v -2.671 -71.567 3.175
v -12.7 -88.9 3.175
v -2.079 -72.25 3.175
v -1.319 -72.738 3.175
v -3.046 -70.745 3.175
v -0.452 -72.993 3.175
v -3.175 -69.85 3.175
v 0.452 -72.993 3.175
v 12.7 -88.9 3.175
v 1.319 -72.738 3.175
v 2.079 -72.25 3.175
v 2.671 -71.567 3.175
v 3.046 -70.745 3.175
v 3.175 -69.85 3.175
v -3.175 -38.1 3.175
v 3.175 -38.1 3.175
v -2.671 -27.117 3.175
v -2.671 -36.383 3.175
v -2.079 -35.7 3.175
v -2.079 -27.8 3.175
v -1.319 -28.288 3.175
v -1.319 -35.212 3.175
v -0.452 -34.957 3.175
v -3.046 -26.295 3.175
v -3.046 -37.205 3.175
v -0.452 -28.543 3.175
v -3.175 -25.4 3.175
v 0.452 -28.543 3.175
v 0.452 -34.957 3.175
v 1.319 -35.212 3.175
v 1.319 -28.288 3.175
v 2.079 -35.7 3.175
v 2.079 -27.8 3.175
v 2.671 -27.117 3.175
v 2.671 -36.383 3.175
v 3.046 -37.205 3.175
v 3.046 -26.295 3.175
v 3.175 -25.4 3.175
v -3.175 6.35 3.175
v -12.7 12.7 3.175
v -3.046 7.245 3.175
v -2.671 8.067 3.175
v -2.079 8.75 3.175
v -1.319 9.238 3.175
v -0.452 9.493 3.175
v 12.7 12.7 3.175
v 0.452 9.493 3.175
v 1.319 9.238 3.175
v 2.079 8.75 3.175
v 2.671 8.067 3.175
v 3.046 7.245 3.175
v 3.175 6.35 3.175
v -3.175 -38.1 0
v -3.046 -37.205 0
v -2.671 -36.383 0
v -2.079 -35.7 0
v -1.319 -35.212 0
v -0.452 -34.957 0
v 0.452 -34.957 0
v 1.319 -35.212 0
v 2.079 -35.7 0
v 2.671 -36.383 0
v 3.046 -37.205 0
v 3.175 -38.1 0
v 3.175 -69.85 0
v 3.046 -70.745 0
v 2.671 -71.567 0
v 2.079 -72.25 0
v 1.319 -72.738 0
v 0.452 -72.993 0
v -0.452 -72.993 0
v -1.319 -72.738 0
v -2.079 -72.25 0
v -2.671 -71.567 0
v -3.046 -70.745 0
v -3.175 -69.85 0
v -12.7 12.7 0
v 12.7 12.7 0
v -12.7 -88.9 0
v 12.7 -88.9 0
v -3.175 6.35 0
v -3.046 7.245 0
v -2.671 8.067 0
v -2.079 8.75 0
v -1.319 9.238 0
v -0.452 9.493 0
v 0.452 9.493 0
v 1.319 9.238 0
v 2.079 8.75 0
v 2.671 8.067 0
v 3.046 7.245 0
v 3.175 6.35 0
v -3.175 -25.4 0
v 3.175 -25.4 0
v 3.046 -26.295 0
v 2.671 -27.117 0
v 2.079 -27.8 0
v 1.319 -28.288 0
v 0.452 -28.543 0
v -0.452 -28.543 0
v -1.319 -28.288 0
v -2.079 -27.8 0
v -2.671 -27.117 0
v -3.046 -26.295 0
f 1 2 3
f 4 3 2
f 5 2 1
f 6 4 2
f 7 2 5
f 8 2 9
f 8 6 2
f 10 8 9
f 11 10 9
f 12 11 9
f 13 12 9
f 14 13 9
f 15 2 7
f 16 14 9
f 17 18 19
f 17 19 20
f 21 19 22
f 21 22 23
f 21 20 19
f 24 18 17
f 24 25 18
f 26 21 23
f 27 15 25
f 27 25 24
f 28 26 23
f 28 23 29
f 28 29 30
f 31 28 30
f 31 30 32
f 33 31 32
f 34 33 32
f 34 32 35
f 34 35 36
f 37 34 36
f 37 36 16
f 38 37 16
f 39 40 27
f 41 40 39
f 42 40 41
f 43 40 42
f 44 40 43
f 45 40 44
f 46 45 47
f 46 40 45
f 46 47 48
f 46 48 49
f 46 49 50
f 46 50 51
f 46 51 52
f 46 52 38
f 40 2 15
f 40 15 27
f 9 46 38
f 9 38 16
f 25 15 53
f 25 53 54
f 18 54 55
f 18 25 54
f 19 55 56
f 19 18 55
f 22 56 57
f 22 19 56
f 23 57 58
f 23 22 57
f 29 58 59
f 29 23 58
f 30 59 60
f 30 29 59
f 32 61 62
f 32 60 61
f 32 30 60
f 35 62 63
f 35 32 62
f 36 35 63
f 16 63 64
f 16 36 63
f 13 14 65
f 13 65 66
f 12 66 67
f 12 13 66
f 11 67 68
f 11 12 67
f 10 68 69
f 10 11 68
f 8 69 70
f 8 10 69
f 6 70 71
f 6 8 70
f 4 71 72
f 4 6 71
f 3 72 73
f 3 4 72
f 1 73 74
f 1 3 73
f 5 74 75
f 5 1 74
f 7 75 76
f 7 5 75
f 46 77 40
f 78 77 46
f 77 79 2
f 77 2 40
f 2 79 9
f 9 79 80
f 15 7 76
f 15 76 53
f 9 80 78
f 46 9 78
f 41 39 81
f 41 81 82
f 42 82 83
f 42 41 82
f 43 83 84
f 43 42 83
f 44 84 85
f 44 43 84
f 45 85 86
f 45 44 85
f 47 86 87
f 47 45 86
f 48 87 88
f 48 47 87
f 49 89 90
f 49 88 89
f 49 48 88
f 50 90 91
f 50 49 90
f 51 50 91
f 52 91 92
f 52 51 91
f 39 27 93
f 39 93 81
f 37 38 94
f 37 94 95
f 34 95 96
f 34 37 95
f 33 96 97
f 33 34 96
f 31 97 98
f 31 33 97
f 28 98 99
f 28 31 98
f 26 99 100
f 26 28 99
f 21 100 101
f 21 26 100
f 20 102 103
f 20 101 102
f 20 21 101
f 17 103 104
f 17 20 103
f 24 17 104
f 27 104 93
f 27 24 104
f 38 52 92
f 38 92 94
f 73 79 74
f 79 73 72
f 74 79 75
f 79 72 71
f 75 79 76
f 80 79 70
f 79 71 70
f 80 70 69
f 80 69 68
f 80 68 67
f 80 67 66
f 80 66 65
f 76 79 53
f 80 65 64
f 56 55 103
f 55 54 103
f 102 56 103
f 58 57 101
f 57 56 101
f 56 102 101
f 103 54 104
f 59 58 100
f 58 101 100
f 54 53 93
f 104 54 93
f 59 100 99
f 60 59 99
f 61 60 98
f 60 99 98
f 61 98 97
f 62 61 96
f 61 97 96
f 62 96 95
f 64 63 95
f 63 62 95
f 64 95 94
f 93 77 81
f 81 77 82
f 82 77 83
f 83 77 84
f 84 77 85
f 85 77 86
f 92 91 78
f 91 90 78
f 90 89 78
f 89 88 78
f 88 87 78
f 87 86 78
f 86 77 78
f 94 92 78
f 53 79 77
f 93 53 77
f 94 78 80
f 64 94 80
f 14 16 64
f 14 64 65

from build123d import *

# Parameters (mm, degrees)
SKETCH1_W           = 25.4
SKETCH1_H           = 101.6
SKETCH1_R           = 2.38125
BOSS_EXTRUDE1_DEPTH = 3.175
CUT_EXTRUDE1_DEPTH  = 4.175


with BuildPart() as part:
    # Sketch1 → Boss-Extrude1 (new body)
    with BuildSketch(Plane.XY):
        with Locations((0, -38.1)):
            Rectangle(SKETCH1_W, SKETCH1_H)
        with Locations((0, 6.35)):
            Circle(SKETCH1_R, mode=Mode.SUBTRACT)
        with Locations((0, -69.85)):
            Circle(SKETCH1_R, mode=Mode.SUBTRACT)
    extrude(amount=BOSS_EXTRUDE1_DEPTH)

    # Sketch2 → Cut-Extrude1 (cut, through all)
    with BuildSketch(Plane.XY.offset(3.175)):
        with BuildLine():
            Line((-3.175, -25.4), (-3.175, 6.35))
            ThreePointArc((-3.175, 6.35), (0, 9.525), (3.175, 6.35))
            Line((3.175, 6.35), (3.175, -25.4))
            ThreePointArc((3.175, -25.4), (0, -28.575), (-3.175, -25.4))
        make_face()
        with BuildLine():
            Line((-3.175, -69.85), (-3.175, -38.1))
            ThreePointArc((-3.175, -38.1), (0, -34.925), (3.175, -38.1))
            Line((3.175, -38.1), (3.175, -69.85))
            ThreePointArc((3.175, -69.85), (0, -73.025), (-3.175, -69.85))
        make_face()
    extrude(amount=-CUT_EXTRUDE1_DEPTH, mode=Mode.SUBTRACT)


solid = part.part
